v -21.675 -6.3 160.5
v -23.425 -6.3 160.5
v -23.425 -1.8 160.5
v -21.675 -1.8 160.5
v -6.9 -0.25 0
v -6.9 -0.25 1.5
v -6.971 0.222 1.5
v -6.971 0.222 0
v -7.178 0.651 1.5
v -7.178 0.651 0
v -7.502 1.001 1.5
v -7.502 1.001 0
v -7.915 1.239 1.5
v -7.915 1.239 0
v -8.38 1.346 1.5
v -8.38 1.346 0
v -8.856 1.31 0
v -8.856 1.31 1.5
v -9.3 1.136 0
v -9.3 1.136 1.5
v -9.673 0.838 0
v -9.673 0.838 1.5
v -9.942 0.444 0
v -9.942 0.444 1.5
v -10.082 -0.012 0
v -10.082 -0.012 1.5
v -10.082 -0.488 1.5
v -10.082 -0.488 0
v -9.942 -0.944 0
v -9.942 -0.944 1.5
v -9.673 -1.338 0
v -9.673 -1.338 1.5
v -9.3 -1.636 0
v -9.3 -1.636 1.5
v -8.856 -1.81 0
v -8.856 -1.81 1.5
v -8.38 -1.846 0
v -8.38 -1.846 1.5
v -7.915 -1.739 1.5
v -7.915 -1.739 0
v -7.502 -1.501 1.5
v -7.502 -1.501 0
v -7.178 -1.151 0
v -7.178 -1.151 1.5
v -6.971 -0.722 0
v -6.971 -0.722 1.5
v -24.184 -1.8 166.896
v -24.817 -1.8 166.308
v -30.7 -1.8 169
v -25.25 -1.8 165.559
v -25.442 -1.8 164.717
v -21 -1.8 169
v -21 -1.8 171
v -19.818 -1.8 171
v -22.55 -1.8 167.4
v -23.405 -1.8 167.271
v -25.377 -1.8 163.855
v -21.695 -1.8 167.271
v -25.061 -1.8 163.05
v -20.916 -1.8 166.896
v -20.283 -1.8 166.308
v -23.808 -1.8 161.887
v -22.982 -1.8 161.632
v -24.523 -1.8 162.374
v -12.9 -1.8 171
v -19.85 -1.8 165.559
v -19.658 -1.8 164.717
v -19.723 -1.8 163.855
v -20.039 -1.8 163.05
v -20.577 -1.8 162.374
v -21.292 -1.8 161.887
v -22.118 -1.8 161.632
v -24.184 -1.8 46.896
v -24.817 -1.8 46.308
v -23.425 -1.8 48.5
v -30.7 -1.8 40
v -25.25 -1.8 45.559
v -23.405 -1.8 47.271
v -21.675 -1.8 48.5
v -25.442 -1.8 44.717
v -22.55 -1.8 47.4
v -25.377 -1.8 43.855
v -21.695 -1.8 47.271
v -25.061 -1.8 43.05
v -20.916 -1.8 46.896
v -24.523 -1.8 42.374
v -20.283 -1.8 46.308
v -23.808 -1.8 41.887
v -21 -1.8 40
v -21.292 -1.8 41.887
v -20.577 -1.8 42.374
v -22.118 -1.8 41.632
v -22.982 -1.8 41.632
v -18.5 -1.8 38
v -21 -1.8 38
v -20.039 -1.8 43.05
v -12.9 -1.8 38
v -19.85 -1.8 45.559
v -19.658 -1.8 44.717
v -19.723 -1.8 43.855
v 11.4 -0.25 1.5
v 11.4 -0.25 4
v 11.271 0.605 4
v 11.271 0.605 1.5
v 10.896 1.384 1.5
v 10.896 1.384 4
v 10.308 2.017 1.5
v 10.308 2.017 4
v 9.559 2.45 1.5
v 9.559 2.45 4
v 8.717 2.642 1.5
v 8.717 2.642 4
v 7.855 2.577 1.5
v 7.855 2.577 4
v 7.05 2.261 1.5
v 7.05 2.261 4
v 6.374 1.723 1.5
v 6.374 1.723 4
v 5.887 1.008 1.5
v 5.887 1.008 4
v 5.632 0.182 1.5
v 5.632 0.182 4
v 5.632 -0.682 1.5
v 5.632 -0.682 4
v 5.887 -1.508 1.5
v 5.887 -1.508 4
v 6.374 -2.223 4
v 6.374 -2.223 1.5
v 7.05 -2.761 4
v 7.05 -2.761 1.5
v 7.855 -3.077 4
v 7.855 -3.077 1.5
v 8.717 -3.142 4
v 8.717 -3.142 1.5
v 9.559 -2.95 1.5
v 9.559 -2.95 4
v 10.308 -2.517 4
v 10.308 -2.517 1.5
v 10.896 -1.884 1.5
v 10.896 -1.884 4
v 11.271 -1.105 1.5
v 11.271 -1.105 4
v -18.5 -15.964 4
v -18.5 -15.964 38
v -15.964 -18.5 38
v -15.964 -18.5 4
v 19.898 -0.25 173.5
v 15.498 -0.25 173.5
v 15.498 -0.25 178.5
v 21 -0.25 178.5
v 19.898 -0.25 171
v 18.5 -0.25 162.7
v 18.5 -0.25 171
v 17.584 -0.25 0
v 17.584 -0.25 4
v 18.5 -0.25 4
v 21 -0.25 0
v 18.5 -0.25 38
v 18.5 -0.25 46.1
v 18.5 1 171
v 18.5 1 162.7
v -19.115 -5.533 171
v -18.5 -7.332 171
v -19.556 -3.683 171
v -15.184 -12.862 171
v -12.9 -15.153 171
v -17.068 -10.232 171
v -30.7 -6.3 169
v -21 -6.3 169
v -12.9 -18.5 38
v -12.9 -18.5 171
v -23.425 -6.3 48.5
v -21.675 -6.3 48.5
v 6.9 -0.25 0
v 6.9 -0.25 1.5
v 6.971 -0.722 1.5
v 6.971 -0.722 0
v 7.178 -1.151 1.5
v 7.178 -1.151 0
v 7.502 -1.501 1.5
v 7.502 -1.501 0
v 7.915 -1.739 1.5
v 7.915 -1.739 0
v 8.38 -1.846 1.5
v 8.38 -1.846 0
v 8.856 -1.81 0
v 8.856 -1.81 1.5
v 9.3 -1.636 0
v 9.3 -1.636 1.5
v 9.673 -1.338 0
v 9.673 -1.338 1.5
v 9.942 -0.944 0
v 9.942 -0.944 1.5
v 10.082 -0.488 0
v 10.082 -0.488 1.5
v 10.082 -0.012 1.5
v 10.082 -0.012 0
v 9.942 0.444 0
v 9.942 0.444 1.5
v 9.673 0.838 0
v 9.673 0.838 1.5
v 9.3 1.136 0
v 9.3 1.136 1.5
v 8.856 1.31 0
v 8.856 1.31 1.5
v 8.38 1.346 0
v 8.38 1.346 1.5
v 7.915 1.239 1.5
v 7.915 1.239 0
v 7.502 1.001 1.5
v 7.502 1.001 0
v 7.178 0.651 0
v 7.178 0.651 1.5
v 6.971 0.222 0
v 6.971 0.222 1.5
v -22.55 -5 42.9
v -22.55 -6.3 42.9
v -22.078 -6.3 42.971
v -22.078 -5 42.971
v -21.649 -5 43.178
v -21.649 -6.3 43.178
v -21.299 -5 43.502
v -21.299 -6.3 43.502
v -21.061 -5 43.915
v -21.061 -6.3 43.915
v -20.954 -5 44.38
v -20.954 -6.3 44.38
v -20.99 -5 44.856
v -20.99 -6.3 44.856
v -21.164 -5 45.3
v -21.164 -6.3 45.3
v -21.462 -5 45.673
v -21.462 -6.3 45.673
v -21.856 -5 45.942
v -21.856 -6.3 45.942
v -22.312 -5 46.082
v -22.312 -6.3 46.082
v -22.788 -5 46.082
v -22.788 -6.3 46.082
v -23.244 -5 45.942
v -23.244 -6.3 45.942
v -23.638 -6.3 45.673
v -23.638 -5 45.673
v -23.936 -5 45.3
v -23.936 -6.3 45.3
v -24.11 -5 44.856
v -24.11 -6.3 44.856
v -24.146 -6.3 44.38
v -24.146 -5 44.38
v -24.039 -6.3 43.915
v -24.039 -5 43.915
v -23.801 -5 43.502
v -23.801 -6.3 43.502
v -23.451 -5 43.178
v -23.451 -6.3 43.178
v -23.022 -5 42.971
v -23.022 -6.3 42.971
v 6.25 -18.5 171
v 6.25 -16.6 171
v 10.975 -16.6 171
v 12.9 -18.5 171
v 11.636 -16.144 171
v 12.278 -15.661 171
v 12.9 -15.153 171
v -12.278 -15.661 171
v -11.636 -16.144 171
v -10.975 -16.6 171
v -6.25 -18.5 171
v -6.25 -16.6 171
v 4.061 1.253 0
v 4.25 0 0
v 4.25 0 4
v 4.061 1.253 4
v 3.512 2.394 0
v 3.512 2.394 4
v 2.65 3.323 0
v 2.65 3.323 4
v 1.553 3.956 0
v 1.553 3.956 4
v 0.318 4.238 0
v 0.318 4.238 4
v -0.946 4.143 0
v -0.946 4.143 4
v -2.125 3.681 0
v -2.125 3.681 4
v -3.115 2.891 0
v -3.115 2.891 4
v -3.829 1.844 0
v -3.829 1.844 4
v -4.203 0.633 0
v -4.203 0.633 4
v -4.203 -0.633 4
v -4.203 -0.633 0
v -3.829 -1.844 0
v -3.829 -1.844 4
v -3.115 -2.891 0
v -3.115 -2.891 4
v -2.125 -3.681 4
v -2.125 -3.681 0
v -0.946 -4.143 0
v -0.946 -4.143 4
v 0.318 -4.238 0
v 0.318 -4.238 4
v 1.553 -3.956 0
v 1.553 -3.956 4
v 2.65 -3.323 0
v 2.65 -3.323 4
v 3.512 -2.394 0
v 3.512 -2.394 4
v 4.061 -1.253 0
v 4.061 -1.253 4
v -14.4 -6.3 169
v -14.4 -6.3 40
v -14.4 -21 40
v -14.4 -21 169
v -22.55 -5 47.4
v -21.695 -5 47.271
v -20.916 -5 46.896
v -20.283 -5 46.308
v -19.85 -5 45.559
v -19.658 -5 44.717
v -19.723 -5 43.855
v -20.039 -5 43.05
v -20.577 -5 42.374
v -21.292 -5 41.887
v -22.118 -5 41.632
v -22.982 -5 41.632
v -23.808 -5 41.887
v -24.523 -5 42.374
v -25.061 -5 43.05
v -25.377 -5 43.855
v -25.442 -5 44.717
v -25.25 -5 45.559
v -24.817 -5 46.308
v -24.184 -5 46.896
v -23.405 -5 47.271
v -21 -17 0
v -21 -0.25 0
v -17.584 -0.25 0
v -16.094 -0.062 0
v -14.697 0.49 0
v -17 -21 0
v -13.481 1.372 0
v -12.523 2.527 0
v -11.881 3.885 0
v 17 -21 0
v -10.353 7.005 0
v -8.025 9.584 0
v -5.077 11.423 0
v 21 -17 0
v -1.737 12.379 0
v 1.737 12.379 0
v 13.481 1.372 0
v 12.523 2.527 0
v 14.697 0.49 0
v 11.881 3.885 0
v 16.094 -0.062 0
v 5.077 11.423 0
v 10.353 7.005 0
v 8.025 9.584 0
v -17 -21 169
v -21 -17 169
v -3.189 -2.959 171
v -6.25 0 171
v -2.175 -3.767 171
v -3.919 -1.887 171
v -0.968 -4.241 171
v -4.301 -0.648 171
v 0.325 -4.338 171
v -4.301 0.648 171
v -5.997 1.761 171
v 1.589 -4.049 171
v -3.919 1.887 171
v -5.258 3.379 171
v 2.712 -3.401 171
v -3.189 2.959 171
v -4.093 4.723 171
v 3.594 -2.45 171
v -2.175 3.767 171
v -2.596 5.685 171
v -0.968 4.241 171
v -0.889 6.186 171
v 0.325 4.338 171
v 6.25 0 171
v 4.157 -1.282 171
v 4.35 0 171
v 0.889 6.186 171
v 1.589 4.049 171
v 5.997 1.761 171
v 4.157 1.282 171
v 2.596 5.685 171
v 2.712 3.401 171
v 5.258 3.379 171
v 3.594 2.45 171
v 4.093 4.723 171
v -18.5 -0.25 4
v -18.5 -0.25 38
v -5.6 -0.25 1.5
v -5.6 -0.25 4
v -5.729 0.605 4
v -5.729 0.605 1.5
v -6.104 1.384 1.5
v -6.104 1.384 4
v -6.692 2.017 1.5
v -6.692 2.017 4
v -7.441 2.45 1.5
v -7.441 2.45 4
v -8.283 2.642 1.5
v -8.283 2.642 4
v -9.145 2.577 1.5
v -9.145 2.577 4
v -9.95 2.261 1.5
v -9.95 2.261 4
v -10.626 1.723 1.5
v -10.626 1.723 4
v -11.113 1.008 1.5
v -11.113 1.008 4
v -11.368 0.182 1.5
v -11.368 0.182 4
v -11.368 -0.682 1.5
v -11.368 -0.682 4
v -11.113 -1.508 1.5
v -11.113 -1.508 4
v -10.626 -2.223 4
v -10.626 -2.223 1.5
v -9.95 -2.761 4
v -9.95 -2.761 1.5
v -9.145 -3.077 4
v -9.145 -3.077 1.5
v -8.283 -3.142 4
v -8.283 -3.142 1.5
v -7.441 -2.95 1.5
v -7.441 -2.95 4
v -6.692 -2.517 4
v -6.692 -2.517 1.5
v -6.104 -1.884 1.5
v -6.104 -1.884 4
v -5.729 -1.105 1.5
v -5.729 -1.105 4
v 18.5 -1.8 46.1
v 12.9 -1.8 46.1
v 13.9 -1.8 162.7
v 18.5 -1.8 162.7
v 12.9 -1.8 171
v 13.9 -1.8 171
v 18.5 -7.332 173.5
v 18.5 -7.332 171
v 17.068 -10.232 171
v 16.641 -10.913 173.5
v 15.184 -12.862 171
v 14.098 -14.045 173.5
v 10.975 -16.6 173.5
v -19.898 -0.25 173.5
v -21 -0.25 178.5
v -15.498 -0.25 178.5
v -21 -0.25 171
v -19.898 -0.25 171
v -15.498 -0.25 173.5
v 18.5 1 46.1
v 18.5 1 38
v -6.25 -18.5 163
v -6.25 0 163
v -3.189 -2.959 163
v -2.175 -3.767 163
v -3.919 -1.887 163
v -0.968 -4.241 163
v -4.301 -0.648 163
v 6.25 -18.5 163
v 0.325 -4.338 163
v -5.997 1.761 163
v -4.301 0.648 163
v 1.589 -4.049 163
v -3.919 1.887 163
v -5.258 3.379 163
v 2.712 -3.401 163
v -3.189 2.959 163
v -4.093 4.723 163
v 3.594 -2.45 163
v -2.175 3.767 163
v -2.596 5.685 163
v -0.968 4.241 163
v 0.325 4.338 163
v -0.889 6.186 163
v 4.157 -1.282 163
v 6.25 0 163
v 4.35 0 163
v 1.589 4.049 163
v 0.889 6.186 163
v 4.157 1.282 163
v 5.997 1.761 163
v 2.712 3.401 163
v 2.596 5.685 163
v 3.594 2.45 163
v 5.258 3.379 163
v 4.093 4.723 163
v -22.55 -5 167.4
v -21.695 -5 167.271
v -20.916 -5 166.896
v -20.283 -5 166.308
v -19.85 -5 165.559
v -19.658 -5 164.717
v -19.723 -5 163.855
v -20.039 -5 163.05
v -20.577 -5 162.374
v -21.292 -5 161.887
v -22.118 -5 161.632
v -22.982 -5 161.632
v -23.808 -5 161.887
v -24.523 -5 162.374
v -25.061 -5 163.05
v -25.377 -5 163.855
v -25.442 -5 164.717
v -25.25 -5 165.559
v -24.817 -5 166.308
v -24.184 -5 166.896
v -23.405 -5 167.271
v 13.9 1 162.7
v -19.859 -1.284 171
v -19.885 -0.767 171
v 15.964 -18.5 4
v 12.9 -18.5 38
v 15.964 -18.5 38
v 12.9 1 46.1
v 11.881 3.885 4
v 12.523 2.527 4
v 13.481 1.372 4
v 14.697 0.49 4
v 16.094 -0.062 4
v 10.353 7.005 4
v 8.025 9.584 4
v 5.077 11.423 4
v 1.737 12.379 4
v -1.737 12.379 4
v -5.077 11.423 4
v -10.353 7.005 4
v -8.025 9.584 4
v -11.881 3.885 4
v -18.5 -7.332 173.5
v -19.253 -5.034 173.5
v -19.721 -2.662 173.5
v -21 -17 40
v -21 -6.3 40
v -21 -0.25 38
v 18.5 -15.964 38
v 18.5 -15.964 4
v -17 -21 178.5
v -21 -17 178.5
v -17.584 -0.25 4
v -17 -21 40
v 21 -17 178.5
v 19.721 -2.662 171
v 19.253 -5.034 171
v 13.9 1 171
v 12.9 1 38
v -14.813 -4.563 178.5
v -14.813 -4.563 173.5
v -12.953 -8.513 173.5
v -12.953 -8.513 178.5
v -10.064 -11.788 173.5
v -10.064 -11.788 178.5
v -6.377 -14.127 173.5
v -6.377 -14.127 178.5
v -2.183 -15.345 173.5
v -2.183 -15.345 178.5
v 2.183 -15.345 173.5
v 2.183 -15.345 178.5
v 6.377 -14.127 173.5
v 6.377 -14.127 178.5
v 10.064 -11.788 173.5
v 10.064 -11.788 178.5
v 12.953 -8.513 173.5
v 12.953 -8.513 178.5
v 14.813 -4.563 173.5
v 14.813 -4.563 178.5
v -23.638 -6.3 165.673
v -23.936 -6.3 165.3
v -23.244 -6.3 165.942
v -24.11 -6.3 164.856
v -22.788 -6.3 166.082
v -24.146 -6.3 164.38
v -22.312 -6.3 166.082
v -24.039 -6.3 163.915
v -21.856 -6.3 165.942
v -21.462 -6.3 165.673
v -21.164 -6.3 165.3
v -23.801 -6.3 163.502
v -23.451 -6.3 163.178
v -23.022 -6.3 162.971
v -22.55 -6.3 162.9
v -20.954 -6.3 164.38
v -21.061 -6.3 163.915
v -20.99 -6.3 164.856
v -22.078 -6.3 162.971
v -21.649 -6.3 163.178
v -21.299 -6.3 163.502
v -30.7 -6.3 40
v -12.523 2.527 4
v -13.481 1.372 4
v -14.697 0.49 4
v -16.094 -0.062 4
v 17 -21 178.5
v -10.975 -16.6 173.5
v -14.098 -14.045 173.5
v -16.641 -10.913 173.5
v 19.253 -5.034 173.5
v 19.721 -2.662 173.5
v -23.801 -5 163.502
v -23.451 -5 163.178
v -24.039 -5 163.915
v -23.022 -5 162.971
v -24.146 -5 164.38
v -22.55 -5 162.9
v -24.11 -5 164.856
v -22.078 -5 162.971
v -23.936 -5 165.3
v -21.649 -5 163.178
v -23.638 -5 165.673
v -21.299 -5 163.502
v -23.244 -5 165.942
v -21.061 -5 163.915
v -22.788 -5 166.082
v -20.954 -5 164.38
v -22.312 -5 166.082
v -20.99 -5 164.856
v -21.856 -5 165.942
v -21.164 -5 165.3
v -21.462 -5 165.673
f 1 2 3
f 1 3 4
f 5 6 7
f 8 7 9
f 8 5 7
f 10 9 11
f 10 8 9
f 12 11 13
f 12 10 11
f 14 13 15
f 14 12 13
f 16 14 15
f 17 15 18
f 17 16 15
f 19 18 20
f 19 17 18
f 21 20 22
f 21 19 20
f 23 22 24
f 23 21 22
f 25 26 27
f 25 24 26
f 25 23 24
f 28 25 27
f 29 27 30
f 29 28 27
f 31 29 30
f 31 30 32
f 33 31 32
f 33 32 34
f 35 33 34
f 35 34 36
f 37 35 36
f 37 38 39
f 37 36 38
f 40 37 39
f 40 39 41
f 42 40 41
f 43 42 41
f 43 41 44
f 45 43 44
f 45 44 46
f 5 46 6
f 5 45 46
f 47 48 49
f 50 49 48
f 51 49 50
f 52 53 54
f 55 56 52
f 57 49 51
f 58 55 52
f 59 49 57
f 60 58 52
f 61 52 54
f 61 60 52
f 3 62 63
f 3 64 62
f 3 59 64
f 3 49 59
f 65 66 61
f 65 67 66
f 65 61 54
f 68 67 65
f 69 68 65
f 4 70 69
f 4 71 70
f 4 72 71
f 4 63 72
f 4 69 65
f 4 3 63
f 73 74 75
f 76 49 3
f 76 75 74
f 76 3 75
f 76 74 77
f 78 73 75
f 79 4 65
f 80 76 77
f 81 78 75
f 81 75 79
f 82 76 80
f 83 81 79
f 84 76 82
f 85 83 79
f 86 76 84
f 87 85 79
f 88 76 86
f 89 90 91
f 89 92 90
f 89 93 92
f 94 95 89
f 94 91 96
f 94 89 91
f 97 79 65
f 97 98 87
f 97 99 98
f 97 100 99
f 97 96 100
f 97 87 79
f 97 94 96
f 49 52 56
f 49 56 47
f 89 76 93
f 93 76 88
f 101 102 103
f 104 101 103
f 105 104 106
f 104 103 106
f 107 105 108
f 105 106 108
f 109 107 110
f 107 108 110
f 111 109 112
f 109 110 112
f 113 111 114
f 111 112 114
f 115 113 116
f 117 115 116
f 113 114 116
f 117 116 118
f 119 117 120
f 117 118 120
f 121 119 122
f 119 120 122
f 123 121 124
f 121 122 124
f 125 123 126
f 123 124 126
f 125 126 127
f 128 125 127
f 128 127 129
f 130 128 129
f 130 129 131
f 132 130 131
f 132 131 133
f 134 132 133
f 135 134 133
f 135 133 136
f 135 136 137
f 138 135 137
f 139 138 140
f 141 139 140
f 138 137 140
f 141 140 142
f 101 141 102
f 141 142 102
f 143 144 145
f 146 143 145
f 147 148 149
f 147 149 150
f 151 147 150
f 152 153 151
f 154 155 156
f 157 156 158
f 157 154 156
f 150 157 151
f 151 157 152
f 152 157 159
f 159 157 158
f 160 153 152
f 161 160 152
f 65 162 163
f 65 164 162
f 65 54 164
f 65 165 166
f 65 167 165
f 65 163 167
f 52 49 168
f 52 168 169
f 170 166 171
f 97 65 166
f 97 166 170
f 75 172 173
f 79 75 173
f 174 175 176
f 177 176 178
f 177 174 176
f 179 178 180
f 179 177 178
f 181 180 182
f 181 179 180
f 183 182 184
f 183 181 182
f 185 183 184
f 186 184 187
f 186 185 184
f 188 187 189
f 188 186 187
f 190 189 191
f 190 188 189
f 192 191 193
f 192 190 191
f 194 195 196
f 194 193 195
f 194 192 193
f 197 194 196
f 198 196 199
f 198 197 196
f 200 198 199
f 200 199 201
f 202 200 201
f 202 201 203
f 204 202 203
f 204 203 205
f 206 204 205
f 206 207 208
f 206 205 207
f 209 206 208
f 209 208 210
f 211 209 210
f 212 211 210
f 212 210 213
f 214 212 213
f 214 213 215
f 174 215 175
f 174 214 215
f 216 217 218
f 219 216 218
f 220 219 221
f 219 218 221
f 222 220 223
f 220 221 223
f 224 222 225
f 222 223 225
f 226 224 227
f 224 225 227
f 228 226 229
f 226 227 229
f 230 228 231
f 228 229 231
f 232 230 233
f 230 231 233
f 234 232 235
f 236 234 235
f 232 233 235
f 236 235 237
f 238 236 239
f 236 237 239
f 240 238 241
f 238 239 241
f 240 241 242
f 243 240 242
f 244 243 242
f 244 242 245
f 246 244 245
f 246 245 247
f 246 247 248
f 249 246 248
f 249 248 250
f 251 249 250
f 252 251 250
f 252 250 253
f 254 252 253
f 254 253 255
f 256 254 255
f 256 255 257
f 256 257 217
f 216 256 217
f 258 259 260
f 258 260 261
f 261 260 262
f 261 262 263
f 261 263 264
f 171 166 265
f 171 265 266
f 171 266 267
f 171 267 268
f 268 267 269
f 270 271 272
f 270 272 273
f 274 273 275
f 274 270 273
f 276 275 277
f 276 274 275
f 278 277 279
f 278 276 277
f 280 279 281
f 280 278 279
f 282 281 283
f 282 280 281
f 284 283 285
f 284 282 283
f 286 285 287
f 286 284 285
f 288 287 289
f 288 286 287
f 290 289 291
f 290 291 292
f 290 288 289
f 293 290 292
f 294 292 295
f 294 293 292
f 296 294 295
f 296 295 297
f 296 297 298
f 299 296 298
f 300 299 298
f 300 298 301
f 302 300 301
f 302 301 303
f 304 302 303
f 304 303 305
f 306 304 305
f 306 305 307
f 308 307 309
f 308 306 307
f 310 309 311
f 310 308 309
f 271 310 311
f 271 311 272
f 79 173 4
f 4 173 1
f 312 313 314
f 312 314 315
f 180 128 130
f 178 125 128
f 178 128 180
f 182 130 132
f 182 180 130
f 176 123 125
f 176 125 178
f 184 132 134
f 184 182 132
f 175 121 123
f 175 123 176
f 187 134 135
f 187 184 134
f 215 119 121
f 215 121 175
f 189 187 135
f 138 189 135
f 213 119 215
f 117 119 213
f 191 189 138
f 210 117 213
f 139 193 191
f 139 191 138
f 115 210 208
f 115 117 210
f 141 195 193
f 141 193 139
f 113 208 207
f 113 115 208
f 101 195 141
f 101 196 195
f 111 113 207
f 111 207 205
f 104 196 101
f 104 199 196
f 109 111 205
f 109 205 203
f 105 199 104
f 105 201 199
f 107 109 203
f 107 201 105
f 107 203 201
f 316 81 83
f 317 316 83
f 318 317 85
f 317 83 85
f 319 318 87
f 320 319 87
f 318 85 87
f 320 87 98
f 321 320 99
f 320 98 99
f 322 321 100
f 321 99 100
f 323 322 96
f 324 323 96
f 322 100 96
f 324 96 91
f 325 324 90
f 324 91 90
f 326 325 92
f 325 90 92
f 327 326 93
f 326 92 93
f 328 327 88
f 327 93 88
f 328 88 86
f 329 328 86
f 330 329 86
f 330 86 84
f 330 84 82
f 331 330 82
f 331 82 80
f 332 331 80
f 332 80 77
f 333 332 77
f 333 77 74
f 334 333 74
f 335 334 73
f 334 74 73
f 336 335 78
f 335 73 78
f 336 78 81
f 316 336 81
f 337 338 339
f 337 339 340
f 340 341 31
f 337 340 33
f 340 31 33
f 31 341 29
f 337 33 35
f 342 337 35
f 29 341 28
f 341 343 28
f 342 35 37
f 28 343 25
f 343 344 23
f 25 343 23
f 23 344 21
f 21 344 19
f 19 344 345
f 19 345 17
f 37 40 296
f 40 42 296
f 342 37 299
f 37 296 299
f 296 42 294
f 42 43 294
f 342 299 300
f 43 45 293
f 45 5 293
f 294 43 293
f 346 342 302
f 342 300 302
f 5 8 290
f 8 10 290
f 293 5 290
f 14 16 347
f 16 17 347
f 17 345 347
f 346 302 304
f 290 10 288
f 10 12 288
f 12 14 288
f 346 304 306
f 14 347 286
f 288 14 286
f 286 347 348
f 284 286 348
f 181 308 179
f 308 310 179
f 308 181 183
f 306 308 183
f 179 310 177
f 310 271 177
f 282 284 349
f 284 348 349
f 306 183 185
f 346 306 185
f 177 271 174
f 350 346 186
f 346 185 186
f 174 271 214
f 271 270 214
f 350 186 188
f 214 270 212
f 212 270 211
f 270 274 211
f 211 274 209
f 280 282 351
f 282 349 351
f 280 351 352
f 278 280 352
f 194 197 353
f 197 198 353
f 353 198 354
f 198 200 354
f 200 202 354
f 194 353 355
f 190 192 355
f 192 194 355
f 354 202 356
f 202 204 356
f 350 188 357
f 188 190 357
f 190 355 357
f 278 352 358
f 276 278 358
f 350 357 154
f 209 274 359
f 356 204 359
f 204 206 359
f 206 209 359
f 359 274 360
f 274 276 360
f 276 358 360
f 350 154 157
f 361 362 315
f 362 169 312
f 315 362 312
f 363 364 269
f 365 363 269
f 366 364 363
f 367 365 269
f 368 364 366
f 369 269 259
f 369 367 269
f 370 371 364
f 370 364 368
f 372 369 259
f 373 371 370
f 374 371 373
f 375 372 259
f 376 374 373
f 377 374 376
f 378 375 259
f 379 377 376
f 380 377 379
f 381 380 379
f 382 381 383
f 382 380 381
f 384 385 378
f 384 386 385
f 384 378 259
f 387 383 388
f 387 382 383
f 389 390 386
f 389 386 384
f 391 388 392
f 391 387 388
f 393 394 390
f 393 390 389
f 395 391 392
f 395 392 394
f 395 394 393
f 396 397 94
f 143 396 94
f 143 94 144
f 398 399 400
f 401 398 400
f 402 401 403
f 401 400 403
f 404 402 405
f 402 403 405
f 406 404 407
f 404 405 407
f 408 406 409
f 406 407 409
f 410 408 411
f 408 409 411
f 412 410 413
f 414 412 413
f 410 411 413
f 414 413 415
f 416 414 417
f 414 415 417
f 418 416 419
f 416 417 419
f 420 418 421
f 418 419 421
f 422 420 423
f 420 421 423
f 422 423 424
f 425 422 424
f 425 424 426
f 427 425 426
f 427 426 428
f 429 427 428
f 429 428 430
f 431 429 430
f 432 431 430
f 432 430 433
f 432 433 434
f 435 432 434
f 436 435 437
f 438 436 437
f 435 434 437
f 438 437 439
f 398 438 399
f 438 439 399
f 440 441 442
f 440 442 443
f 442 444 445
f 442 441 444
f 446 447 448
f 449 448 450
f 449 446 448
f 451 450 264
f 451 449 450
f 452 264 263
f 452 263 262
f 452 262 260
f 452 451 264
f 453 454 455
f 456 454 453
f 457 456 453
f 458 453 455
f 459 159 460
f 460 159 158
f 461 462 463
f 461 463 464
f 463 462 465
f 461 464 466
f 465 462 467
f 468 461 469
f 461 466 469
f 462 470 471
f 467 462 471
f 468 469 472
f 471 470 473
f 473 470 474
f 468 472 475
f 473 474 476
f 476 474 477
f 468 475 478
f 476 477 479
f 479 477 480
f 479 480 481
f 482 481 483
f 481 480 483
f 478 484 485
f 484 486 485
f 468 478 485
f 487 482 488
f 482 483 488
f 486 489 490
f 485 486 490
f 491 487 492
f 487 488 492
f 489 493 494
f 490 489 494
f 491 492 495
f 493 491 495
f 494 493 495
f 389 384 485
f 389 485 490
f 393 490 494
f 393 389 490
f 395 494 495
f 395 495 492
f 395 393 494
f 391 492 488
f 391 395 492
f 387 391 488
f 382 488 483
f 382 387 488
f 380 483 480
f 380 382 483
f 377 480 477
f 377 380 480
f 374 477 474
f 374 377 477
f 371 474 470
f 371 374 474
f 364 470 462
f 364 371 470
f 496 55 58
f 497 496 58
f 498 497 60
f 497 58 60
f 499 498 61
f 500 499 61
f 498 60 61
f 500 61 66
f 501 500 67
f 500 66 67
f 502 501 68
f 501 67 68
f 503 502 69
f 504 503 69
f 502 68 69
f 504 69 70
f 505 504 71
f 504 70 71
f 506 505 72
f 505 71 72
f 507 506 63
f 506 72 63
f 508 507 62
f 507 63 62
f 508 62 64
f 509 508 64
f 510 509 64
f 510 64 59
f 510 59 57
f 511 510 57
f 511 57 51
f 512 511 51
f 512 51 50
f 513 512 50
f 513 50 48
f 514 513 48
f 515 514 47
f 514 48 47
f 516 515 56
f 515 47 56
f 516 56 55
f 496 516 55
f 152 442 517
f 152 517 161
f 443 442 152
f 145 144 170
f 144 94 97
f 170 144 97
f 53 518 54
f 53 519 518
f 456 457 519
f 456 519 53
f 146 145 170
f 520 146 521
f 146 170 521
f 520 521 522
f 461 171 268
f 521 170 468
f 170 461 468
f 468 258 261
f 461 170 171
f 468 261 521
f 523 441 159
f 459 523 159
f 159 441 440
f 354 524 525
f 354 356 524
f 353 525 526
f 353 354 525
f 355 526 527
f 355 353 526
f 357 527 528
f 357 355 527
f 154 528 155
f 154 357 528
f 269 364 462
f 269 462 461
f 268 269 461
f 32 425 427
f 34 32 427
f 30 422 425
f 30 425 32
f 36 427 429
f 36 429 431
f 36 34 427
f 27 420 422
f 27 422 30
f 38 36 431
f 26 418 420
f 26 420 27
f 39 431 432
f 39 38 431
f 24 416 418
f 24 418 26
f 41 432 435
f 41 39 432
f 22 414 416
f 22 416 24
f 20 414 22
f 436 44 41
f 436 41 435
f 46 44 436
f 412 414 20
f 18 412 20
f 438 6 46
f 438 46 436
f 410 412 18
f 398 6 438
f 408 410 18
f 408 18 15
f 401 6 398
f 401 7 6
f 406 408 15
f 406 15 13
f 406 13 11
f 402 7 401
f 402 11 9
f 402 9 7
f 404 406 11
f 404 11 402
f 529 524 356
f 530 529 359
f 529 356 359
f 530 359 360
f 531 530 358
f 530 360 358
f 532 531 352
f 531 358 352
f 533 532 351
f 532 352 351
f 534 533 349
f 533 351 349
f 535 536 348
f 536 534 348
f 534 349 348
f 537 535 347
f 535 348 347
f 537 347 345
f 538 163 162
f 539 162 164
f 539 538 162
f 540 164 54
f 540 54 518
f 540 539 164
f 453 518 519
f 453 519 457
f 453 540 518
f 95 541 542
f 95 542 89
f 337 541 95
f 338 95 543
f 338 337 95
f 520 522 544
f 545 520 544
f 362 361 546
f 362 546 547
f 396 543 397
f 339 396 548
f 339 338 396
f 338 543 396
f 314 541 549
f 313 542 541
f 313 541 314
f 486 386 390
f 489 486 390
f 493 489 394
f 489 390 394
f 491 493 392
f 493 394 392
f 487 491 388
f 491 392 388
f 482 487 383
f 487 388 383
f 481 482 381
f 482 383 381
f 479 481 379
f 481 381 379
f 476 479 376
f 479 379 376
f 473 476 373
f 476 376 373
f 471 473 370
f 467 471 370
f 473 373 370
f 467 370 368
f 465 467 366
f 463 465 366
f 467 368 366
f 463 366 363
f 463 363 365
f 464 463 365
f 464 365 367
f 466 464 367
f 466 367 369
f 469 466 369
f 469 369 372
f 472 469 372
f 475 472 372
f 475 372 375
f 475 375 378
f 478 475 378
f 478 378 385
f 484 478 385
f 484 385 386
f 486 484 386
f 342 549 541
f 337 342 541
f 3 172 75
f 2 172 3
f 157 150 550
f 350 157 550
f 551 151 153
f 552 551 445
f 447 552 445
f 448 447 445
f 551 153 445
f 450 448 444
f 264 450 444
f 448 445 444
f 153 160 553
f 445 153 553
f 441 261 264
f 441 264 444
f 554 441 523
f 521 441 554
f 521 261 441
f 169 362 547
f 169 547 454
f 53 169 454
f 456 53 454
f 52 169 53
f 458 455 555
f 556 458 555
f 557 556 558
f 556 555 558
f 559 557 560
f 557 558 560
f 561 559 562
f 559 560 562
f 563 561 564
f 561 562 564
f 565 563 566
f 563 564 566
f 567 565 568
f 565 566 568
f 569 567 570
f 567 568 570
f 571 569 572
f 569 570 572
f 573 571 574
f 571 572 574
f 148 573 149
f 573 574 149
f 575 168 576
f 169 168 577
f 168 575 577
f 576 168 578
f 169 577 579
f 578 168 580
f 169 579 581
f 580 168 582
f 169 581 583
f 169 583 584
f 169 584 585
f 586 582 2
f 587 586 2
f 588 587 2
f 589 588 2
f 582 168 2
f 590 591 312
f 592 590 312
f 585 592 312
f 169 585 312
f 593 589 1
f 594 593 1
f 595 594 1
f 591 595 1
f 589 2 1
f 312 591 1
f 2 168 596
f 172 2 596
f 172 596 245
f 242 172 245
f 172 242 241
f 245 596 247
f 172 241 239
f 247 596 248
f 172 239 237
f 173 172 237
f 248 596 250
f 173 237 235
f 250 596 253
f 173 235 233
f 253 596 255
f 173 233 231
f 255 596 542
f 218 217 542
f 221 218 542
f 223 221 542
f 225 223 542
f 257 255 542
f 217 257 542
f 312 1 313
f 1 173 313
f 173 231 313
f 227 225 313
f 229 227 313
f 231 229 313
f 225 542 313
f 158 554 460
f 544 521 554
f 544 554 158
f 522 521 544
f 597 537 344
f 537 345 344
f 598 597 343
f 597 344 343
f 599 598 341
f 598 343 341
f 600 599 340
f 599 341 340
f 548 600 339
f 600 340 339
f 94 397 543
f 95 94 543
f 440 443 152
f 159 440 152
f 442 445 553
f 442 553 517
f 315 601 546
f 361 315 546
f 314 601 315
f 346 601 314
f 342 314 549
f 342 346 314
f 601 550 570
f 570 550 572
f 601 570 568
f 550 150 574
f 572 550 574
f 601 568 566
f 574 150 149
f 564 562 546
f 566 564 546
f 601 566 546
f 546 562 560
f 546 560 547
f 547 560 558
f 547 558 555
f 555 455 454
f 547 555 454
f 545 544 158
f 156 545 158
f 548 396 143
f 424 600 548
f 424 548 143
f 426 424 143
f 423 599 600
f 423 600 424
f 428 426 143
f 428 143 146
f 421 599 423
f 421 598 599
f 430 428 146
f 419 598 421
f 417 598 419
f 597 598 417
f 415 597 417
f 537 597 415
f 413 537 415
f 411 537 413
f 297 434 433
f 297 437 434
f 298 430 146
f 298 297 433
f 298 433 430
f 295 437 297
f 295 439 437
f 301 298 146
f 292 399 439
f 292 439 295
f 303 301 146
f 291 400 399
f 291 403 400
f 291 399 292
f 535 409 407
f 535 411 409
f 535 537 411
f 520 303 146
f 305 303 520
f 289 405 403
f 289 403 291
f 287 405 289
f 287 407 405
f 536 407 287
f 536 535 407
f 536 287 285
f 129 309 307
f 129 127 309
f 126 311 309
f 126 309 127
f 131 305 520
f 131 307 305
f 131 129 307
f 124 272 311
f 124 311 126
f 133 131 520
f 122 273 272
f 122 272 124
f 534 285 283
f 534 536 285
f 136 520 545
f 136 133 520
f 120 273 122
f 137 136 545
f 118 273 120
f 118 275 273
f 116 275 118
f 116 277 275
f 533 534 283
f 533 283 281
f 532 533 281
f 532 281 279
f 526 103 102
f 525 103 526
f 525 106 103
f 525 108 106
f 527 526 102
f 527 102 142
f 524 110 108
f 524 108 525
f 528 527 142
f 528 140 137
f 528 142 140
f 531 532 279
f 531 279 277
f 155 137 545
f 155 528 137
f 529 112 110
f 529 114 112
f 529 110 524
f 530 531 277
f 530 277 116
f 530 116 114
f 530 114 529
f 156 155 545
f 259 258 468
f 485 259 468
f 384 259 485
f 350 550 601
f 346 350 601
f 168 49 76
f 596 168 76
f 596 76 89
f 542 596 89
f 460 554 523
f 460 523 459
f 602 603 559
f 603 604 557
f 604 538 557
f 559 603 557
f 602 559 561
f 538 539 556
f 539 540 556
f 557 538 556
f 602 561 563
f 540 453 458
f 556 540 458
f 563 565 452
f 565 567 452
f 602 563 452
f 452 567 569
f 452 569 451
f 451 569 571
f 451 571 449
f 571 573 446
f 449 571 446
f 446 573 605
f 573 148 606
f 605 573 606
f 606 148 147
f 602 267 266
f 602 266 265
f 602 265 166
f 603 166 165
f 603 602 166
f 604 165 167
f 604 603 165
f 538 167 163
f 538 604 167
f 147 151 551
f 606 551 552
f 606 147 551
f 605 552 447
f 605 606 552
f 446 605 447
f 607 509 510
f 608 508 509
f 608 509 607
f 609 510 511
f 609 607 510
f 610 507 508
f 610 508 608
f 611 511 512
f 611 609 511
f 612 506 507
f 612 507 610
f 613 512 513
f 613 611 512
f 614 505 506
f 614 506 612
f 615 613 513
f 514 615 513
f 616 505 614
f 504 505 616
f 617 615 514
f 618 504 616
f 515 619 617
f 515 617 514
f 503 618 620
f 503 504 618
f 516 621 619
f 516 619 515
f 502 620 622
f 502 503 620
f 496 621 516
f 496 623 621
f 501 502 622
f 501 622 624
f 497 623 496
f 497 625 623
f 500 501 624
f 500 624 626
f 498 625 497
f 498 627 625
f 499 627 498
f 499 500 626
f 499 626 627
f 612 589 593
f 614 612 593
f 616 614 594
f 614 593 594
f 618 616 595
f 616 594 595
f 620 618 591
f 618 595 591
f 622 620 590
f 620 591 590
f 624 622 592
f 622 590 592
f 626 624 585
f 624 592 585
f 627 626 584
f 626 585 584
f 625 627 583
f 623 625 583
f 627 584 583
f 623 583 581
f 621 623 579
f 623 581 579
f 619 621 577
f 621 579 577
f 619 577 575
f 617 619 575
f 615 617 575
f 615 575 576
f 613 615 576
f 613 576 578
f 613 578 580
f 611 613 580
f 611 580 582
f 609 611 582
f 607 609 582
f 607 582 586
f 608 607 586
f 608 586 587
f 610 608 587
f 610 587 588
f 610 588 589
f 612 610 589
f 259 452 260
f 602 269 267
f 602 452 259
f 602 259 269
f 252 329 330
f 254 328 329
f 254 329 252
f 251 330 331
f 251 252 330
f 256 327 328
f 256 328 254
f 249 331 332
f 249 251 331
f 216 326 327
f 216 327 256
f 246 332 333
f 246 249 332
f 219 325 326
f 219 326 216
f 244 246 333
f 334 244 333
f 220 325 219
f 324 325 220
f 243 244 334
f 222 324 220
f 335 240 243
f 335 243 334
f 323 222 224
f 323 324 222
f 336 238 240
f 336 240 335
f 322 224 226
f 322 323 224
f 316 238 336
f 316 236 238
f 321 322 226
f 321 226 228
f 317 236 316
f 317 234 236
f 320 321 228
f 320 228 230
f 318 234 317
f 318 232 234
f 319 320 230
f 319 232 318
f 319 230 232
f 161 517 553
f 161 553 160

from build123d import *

# Parameters (mm, degrees)
BOSS_EXTRUDE1_DEPTH = 178.5
CUT_EXTRUDE3_DEPTH  = 169.5
CUT_EXTRUDE2_REACH  = 182.954
SKETCH3_R           = 15.5
CUT_EXTRUDE4_DEPTH  = 2.5
BOSS_EXTRUDE3_DEPTH = 8
BOSS_EXTRUDE4_DEPTH = 133
SKETCH11_R          = 4.35
CUT_EXTRUDE6_DEPTH  = 10
SKETCH12_W          = 6.838099821
SKETCH12_H          = 1.8
CUT_EXTRUDE7_DEPTH  = 133
SKETCH13_W          = 17.8
SKETCH13_H          = 129
BOSS_EXTRUDE5_DEPTH = 4.5
SKETCH16_W          = 16.3
SKETCH16_H          = 129
CUT_EXTRUDE8_DEPTH  = 182.71634489
SKETCH17_R          = 1.6
SKETCH17_W          = 1.75
SKETCH17_H          = 112
CUT_EXTRUDE10_DEPTH = 182.71634489
SKETCH18_R          = 2.9
CUT_EXTRUDE11_DEPTH = 3.2
SKETCH19_R          = 12.5
BOSS_EXTRUDE6_DEPTH = 4
SKETCH20_R          = 4.25
SKETCH20_R_2        = 1.6
CUT_EXTRUDE12_DEPTH = 4
SKETCH21_R          = 2.9
CUT_EXTRUDE13_DEPTH = 2.5
FILLET1_R           = 6
SKETCH22_W          = 5.6
SKETCH22_H          = 8.1
SKETCH22_W_2        = 4.6
SKETCH22_H_2        = 8.3
BOSS_EXTRUDE7_DEPTH = 2.8
BOSS_EXTRUDE8_DEPTH = 2.5


with BuildPart() as part:
    # Sketch1 → Boss-Extrude1 (new body)
    with BuildSketch(Plane.XY):
        Polygon((-21, -0.25), (21, -0.25), (21, -17), (17, -21), (-17, -21), (-21, -17), align=None)
    extrude(amount=BOSS_EXTRUDE1_DEPTH)

    # Sketch4 → Cut-Extrude3 (cut)
    with BuildSketch(Plane.XY.offset(173.5)):
        Polygon((-18.5, -15.964466094), (-15.964466094, -18.5), (15.964466094, -18.5), (18.5, -15.964466094), (18.5, -2.75), (18.5, -0.25), (-18.5, -0.25), (-18.5, -2.75), align=None)
    extrude(amount=-CUT_EXTRUDE3_DEPTH, mode=Mode.SUBTRACT)

    # Sketch3 → Cut-Extrude2 (cut, up to next)
    with BuildSketch(Plane.XY.offset(178.5), mode=Mode.PRIVATE) as cut_extrude2_sk1:
        Circle(SKETCH3_R)
    cut_extrude2_tool1 = extrude(cut_extrude2_sk1.sketch, amount=-CUT_EXTRUDE2_REACH, mode=Mode.PRIVATE) & part.part
    add(cut_extrude2_tool1.solids().sort_by_distance((0, 0, 178.5))[0], mode=Mode.SUBTRACT)

    # Sketch6 → Cut-Extrude4 (cut)
    with BuildSketch(Plane.XY.offset(173.5)):
        with BuildLine():
            Line((-10.974971526, 16.6), (10.974971526, 16.6))
            ThreePointArc((10.974971526, 16.6), (19.9, 0), (10.974971526, -16.6))
            Line((10.974971526, -16.6), (-10.974971526, -16.6))
            ThreePointArc((-10.974971526, -16.6), (-19.9, 0), (-10.974971526, 16.6))
        make_face()
    extrude(amount=-CUT_EXTRUDE4_DEPTH, mode=Mode.SUBTRACT)

    # Sketch7 → Boss-Extrude3 (add)
    with BuildSketch(Plane.XY.offset(171)):
        with BuildLine():
            Line((-6.25, 0), (-6.25, -21))
            Line((-6.25, -21), (6.25, -21))
            Line((6.25, -21), (6.25, 0))
            ThreePointArc((6.25, 0), (0, 6.25), (-6.25, 0))
        make_face()
    extrude(amount=-BOSS_EXTRUDE3_DEPTH)

    # Sketch10 → Boss-Extrude4 (add)
    with BuildSketch(Plane.XY.offset(171)):
        Polygon((-18.5, -1.8), (-18.5, -15.964466094), (-15.964466094, -18.5), (-12.9, -18.5), (-12.9, -1.8), align=None)
    boss_extrude4 = extrude(amount=-BOSS_EXTRUDE4_DEPTH)

    # Mirror1: Boss-Extrude4 across plane
    add(boss_extrude4.mirror(Plane(origin=(0, 0, 0), x_dir=(0, 0, 1), z_dir=(1, 0, 0))))

    # Sketch11 → Cut-Extrude6 (cut)
    with BuildSketch(Plane.XY.offset(171)):
        Circle(SKETCH11_R)
    extrude(amount=-CUT_EXTRUDE6_DEPTH, mode=Mode.SUBTRACT)

    # Sketch12 → Cut-Extrude7 (cut)
    with BuildSketch(Plane(origin=(0, 0, 38), x_dir=(-1, 0, 0), z_dir=(0, 0, -1))):
        with Locations((21.919049911, -0.9)):
            Rectangle(SKETCH12_W, SKETCH12_H)
    extrude(amount=-CUT_EXTRUDE7_DEPTH, mode=Mode.SUBTRACT)

    # Sketch13 → Boss-Extrude5 (add)
    with BuildSketch(Plane(origin=(0, -1.8, 0), x_dir=(1, 0, 0), z_dir=(0, 1, 0))):
        with Locations((-21.8, -104.5)):
            Rectangle(SKETCH13_W, SKETCH13_H)
    extrude(amount=-BOSS_EXTRUDE5_DEPTH)

    # Sketch16 → Cut-Extrude8 (cut, through all)
    with BuildSketch(Plane.XZ.offset(6.3)):
        with Locations((-22.55, 104.5)):
            Rectangle(SKETCH16_W, SKETCH16_H)
    extrude(amount=CUT_EXTRUDE8_DEPTH, mode=Mode.SUBTRACT)

    # Sketch17 → Cut-Extrude10 (cut, through all)
    with BuildSketch(Plane.XZ.offset(6.3)):
        with Locations(Location((-22.55, 164.5, 0), (0, 0, 270))):
            Circle(SKETCH17_R)
        with Locations(Location((-22.55, 44.5, 0), (0, 0, 270))):
            Circle(SKETCH17_R)
        with Locations((-22.55, 104.5)):
            Rectangle(SKETCH17_W, SKETCH17_H)
    extrude(amount=-CUT_EXTRUDE10_DEPTH, mode=Mode.SUBTRACT)

    # Sketch18 → Cut-Extrude11 (cut)
    with BuildSketch(Plane(origin=(0, -1.8, 0), x_dir=(1, 0, 0), z_dir=(0, 1, 0))):
        with Locations(Location((-22.55, -164.5, 0), (0, 0, 270))):
            Circle(SKETCH18_R)
        with Locations(Location((-22.55, -44.5, 0), (0, 0, 270))):
            Circle(SKETCH18_R)
    extrude(amount=-CUT_EXTRUDE11_DEPTH, mode=Mode.SUBTRACT)

    # Sketch19 → Boss-Extrude6 (add)
    with BuildSketch(Plane.XY):
        Circle(SKETCH19_R)
    extrude(amount=BOSS_EXTRUDE6_DEPTH)

    # Sketch20 → Cut-Extrude12 (cut)
    with BuildSketch(Plane.XY):
        Circle(SKETCH20_R)
        with Locations((-8.5, -0.25)):
            Circle(SKETCH20_R_2)
        with Locations(Location((8.5, -0.25, 0), (0, 0, 180))):
            Circle(SKETCH20_R_2)
    extrude(amount=CUT_EXTRUDE12_DEPTH, mode=Mode.SUBTRACT)

    # Sketch21 → Cut-Extrude13 (cut)
    with BuildSketch(Plane.XY.offset(4)):
        with Locations((-8.5, -0.25)):
            Circle(SKETCH21_R)
        with Locations((8.5, -0.25)):
            Circle(SKETCH21_R)
    extrude(amount=-CUT_EXTRUDE13_DEPTH, mode=Mode.SUBTRACT)

    # Fillet1
    fillet1_edges = [part.edges().sort_by_distance(p)[0] for p in [
        (12.49749975, -0.25, 2),
        (-12.49749975, -0.25, 2),
    ]]
    fillet(fillet1_edges, radius=FILLET1_R)

    # Sketch22 → Boss-Extrude7 (add)
    with BuildSketch(Plane(origin=(0, -1.8, 0), x_dir=(1, 0, 0), z_dir=(0, 1, 0))):
        with Locations((15.7, -42.05)):
            Rectangle(SKETCH22_W, SKETCH22_H)
        with Locations((16.2, -166.85)):
            Rectangle(SKETCH22_W_2, SKETCH22_H_2)
    extrude(amount=BOSS_EXTRUDE7_DEPTH)

    # Sketch23 → Boss-Extrude8 (add)
    with BuildSketch(Plane(origin=(0, 0, 173.5), x_dir=(-1, 0, 0), z_dir=(0, 0, -1))):
        with BuildLine():
            Line((-10.974971526, -16.6), (10.974971526, -16.6))
            ThreePointArc((10.974971526, -16.6), (15.448847251, -12.543648537), (18.5, -7.332121112))
            Line((18.5, -7.332121112), (18.5, -15.964466094))
            Line((18.5, -15.964466094), (15.964466094, -18.5))
            Line((15.964466094, -18.5), (-15.964466094, -18.5))
            Line((-15.964466094, -18.5), (-18.5, -15.964466094))
            Line((-18.5, -15.964466094), (-18.5, -7.332121112))
            ThreePointArc((-18.5, -7.332121112), (-15.448847251, -12.543648537), (-10.974971526, -16.6))
        make_face()
    extrude(amount=BOSS_EXTRUDE8_DEPTH)


solid = part.part
